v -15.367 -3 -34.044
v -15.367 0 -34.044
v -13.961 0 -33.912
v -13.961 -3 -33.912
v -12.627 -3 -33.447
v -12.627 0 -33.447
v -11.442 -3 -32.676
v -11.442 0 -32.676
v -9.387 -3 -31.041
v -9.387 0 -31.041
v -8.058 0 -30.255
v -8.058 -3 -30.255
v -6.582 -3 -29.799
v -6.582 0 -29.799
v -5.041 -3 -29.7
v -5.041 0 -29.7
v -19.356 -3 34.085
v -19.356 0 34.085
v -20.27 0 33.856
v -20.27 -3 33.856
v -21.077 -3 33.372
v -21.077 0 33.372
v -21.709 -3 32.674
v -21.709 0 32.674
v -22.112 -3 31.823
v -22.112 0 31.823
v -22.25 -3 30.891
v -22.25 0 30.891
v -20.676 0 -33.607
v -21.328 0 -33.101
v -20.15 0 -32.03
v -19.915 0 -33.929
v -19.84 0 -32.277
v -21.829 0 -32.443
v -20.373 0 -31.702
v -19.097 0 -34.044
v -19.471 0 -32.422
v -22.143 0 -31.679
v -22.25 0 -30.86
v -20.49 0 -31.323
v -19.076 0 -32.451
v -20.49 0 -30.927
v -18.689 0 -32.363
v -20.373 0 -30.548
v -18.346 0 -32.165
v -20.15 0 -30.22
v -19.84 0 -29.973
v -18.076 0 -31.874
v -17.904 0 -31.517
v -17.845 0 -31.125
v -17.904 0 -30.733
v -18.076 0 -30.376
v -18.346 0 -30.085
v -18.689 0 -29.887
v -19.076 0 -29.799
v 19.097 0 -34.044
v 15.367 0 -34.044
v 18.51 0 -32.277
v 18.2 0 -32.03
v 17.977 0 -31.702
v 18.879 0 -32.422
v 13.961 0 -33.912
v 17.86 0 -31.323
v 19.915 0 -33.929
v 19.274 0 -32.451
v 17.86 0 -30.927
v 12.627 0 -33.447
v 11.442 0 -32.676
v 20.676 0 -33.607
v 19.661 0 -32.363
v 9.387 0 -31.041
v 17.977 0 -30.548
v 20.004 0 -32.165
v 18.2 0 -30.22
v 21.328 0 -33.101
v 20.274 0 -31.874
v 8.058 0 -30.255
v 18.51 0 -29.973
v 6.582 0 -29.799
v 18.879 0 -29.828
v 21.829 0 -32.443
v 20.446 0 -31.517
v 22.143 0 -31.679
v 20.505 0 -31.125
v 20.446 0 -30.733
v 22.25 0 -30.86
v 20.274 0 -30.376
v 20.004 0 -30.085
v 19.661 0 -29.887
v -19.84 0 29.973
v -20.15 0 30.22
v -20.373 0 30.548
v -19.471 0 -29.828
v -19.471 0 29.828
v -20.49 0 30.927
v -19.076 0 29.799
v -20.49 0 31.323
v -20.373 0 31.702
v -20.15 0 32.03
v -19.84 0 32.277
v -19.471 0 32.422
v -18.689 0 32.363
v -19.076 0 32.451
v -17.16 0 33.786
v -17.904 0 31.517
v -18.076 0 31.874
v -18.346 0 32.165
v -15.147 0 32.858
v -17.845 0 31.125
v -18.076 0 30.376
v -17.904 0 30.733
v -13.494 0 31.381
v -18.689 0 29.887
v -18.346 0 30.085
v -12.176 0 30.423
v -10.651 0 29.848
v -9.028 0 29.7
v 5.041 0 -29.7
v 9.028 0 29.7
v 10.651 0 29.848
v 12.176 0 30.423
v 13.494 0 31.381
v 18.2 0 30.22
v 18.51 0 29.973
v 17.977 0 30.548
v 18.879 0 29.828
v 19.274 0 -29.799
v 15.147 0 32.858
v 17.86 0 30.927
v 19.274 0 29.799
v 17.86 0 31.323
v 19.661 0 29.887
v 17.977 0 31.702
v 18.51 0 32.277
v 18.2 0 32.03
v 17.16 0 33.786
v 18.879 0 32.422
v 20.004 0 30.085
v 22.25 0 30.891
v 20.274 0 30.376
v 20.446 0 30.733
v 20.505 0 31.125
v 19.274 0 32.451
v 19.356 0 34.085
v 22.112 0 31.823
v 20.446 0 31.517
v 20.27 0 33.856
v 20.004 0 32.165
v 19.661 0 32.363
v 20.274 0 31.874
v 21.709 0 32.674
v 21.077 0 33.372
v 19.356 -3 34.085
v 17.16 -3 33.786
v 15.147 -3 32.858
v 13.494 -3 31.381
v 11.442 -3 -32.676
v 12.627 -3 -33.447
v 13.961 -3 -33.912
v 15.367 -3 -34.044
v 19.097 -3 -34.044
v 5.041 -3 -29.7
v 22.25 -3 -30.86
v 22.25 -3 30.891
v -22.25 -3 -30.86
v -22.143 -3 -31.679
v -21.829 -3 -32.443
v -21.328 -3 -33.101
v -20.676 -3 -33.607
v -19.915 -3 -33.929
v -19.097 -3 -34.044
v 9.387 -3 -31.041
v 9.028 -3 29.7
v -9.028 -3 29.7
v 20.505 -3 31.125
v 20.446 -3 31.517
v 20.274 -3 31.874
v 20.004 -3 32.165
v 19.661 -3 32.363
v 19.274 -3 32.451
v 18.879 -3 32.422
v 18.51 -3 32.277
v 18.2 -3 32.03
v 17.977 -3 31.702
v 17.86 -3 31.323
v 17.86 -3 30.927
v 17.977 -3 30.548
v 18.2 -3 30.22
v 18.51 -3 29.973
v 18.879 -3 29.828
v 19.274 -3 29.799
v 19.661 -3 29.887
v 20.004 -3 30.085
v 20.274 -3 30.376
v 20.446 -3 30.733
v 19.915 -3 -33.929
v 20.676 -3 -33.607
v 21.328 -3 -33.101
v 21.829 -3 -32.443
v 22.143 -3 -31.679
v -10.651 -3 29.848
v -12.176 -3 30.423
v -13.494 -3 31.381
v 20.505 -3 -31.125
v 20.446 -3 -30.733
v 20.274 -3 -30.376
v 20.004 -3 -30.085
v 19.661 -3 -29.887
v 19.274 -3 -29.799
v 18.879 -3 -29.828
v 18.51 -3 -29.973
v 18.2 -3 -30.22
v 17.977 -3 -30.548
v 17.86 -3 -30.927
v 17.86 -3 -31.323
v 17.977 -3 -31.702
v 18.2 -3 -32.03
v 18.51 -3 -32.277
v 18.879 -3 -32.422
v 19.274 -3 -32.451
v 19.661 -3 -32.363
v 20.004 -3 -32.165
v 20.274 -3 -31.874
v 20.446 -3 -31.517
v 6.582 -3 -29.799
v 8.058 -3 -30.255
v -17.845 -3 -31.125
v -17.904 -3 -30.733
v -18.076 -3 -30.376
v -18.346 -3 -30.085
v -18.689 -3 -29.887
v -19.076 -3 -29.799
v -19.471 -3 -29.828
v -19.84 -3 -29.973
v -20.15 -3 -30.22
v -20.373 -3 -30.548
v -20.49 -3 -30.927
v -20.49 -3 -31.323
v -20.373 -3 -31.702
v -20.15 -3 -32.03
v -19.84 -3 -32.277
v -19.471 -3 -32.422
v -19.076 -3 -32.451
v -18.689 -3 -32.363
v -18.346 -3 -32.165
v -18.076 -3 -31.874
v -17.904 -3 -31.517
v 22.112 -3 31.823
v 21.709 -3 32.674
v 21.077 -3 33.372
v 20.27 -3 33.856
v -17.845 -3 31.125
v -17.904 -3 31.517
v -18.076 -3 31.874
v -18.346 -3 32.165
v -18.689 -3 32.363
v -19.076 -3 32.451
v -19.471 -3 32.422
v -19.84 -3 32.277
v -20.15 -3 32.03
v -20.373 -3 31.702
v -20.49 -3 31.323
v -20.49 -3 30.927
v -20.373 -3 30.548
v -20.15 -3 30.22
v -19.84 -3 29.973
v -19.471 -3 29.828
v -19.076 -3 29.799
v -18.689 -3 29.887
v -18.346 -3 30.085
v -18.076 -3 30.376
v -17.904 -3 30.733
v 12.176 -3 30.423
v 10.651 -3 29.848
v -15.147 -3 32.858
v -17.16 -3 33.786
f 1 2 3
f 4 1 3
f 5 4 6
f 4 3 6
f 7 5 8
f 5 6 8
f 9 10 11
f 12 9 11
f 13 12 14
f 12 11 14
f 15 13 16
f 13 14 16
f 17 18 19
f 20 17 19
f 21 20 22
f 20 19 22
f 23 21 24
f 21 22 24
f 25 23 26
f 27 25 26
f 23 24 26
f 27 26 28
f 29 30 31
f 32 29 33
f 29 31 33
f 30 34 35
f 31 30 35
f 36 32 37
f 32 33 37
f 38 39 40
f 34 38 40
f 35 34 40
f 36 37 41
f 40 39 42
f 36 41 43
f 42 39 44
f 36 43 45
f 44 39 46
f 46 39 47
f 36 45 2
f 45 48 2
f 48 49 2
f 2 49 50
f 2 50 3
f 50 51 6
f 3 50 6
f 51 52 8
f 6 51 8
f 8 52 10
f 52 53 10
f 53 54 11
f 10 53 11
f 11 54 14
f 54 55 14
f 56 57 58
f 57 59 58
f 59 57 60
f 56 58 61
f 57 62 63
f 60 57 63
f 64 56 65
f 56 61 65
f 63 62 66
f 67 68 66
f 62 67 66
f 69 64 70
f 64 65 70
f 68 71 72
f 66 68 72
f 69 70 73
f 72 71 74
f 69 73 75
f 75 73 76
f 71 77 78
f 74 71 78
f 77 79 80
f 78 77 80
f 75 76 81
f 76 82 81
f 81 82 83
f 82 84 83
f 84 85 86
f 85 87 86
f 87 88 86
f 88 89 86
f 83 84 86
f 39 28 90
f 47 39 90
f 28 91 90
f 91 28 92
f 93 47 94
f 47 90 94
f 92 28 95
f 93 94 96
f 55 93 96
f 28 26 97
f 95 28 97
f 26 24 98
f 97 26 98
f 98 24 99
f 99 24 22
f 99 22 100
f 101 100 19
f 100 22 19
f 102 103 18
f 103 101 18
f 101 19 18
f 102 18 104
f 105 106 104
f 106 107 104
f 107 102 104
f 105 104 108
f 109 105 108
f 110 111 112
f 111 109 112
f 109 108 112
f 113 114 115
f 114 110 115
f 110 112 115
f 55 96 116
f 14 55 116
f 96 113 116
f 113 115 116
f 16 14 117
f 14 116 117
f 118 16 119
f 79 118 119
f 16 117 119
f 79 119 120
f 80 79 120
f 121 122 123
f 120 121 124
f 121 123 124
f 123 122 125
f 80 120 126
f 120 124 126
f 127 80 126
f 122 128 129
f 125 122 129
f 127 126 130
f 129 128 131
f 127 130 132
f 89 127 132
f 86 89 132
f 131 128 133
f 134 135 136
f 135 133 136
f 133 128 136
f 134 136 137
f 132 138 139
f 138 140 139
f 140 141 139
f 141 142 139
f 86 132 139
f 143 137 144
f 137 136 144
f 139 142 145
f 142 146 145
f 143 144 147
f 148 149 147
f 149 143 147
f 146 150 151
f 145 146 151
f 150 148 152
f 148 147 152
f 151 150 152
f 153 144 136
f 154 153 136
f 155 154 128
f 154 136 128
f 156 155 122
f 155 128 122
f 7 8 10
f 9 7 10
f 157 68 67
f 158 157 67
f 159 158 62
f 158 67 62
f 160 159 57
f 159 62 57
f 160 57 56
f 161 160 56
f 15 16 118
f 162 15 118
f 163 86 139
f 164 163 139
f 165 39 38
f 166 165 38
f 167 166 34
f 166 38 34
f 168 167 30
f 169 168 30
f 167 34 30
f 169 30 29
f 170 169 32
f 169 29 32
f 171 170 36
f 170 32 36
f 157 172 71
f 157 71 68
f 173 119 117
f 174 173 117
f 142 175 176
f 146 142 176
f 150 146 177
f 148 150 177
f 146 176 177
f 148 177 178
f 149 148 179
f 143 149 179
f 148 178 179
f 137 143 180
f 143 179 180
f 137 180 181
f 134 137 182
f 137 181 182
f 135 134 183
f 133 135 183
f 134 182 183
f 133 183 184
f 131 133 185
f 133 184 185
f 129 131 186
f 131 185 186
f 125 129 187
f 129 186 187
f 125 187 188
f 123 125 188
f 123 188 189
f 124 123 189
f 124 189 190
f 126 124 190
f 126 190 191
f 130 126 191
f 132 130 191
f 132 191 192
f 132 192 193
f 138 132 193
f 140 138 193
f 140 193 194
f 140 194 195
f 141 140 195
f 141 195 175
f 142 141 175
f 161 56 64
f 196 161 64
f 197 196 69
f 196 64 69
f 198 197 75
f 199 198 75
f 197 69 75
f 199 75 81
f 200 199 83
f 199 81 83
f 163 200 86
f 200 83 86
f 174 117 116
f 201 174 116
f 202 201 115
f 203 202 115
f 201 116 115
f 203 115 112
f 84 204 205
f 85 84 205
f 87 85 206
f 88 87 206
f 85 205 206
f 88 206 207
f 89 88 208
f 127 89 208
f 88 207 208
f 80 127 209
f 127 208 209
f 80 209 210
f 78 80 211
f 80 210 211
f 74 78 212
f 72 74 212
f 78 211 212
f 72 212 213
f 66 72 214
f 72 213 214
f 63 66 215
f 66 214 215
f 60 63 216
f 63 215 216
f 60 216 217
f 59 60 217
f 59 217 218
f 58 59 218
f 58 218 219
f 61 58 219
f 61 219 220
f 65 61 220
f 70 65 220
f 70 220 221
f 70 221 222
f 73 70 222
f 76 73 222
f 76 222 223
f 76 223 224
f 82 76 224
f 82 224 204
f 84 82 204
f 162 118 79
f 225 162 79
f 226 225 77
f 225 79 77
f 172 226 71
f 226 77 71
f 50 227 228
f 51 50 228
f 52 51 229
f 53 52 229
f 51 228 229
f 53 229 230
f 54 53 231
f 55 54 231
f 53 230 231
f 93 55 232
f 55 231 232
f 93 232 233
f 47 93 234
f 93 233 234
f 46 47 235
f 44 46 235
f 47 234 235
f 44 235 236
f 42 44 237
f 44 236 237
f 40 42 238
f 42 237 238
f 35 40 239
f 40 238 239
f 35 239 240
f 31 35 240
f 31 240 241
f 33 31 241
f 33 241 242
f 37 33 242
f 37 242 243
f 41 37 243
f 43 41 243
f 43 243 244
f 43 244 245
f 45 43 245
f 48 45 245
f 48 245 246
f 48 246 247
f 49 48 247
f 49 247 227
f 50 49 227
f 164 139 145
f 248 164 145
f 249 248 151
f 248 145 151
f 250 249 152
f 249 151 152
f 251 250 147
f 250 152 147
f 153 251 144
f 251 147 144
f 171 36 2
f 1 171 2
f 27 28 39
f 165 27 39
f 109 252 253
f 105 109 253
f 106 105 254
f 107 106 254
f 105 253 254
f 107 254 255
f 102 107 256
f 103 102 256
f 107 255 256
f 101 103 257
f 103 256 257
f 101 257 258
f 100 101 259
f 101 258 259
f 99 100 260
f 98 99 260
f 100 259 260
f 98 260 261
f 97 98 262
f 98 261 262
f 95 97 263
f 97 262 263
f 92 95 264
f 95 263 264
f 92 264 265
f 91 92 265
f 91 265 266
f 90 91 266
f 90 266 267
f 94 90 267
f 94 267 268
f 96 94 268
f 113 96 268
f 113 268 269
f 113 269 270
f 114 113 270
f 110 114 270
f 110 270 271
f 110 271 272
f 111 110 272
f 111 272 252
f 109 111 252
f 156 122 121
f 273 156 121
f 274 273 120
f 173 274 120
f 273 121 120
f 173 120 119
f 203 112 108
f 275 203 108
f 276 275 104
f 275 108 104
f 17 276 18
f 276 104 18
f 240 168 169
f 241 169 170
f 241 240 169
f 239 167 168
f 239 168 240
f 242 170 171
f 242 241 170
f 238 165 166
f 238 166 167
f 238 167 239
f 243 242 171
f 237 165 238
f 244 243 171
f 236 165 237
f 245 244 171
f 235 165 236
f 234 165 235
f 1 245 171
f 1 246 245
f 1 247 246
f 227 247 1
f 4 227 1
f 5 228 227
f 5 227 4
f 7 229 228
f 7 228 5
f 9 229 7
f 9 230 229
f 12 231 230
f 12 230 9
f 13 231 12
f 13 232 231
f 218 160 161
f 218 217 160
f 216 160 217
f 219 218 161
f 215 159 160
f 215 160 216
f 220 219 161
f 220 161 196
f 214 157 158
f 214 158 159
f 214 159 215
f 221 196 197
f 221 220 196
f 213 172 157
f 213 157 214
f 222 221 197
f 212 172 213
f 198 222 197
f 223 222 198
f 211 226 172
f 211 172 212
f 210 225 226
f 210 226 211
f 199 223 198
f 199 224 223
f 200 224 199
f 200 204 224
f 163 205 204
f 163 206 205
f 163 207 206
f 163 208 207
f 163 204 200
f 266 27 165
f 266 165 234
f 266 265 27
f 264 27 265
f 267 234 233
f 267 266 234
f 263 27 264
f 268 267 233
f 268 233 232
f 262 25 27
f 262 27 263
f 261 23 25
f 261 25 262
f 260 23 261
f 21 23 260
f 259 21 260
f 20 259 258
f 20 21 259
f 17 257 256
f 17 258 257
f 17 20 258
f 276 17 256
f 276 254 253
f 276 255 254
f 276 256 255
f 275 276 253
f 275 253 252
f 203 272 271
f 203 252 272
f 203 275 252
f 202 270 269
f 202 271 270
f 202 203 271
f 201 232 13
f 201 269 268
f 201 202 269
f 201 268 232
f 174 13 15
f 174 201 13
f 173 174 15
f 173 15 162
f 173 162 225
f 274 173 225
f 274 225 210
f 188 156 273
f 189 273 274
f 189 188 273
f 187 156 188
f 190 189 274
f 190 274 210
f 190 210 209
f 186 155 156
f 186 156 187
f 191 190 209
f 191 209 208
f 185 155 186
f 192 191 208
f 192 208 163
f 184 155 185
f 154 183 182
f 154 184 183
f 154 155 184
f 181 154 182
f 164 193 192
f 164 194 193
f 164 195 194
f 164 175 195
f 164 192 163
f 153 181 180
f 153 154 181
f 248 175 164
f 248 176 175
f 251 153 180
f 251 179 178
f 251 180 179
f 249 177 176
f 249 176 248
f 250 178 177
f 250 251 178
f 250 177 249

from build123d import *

# Parameters (mm, degrees)
F1_DEPTH = 3
F2_R     = 1.33
F3_DEPTH = 3.001


with BuildPart() as f1:
    # F0 (on Front) → F1 (new body)
    with BuildSketch(Plane.XZ):
        with BuildLine():
            ThreePointArc((-19.35648, 34.085312), (-21.41906, 33.046163), (-22.25, 30.891259))
            Line((-22.25, 30.891259), (-22.25, -30.860331))
            ThreePointArc((-22.25, -30.860331), (-21.32844, -33.100719), (-19.097213, -34.04424))
            Line((-19.097213, -34.04424), (-15.3672, -34.04424))
            ThreePointArc((-15.3672, -34.04424), (-13.279512, -33.719597), (-11.44242, -32.676084))
            Line((-11.44242, -32.676084), (-9.386582, -31.040758))
            ThreePointArc((-9.386582, -31.040758), (-7.333283, -29.983659), (-5.04129, -29.700344))
            Line((-5.04129, -29.700344), (0, -29.700344))
            Line((0, -29.700344), (5.04129, -29.700344))
            ThreePointArc((5.04129, -29.700344), (7.333283, -29.983659), (9.386582, -31.040758))
            Line((9.386582, -31.040758), (11.44242, -32.676084))
            ThreePointArc((11.44242, -32.676084), (13.279512, -33.719597), (15.3672, -34.04424))
            Line((15.3672, -34.04424), (19.097213, -34.04424))
            ThreePointArc((19.097213, -34.04424), (21.32844, -33.100719), (22.25, -30.860331))
            Line((22.25, -30.860331), (22.25, 30.891259))
            ThreePointArc((22.25, 30.891259), (21.41906, 33.046163), (19.35648, 34.085312))
            ThreePointArc((19.35648, 34.085312), (16.119272, 33.397026), (13.494445, 31.381204))
            ThreePointArc((13.494445, 31.381204), (11.432837, 30.084307), (9.027799, 29.699656))
            Line((9.027799, 29.699656), (0, 29.699656))
            Line((0, 29.699656), (-9.027799, 29.699656))
            ThreePointArc((-9.027799, 29.699656), (-11.432837, 30.084307), (-13.494445, 31.381204))
            ThreePointArc((-13.494445, 31.381204), (-16.119272, 33.397026), (-19.35648, 34.085312))
        make_face()
    extrude(amount=F1_DEPTH)

    # F2 (on face) → F3 (cut, through all)
    with BuildSketch(Plane.XZ.offset(3)):
        with Locations((-19.175, 31.125)):
            Circle(F2_R)
        with Locations((19.175, 31.125)):
            Circle(F2_R)
        with Locations((19.175, -31.125)):
            Circle(F2_R)
        with Locations((-19.175, -31.125)):
            Circle(F2_R)
    extrude(amount=-F3_DEPTH, mode=Mode.SUBTRACT)


solid = f1.part
